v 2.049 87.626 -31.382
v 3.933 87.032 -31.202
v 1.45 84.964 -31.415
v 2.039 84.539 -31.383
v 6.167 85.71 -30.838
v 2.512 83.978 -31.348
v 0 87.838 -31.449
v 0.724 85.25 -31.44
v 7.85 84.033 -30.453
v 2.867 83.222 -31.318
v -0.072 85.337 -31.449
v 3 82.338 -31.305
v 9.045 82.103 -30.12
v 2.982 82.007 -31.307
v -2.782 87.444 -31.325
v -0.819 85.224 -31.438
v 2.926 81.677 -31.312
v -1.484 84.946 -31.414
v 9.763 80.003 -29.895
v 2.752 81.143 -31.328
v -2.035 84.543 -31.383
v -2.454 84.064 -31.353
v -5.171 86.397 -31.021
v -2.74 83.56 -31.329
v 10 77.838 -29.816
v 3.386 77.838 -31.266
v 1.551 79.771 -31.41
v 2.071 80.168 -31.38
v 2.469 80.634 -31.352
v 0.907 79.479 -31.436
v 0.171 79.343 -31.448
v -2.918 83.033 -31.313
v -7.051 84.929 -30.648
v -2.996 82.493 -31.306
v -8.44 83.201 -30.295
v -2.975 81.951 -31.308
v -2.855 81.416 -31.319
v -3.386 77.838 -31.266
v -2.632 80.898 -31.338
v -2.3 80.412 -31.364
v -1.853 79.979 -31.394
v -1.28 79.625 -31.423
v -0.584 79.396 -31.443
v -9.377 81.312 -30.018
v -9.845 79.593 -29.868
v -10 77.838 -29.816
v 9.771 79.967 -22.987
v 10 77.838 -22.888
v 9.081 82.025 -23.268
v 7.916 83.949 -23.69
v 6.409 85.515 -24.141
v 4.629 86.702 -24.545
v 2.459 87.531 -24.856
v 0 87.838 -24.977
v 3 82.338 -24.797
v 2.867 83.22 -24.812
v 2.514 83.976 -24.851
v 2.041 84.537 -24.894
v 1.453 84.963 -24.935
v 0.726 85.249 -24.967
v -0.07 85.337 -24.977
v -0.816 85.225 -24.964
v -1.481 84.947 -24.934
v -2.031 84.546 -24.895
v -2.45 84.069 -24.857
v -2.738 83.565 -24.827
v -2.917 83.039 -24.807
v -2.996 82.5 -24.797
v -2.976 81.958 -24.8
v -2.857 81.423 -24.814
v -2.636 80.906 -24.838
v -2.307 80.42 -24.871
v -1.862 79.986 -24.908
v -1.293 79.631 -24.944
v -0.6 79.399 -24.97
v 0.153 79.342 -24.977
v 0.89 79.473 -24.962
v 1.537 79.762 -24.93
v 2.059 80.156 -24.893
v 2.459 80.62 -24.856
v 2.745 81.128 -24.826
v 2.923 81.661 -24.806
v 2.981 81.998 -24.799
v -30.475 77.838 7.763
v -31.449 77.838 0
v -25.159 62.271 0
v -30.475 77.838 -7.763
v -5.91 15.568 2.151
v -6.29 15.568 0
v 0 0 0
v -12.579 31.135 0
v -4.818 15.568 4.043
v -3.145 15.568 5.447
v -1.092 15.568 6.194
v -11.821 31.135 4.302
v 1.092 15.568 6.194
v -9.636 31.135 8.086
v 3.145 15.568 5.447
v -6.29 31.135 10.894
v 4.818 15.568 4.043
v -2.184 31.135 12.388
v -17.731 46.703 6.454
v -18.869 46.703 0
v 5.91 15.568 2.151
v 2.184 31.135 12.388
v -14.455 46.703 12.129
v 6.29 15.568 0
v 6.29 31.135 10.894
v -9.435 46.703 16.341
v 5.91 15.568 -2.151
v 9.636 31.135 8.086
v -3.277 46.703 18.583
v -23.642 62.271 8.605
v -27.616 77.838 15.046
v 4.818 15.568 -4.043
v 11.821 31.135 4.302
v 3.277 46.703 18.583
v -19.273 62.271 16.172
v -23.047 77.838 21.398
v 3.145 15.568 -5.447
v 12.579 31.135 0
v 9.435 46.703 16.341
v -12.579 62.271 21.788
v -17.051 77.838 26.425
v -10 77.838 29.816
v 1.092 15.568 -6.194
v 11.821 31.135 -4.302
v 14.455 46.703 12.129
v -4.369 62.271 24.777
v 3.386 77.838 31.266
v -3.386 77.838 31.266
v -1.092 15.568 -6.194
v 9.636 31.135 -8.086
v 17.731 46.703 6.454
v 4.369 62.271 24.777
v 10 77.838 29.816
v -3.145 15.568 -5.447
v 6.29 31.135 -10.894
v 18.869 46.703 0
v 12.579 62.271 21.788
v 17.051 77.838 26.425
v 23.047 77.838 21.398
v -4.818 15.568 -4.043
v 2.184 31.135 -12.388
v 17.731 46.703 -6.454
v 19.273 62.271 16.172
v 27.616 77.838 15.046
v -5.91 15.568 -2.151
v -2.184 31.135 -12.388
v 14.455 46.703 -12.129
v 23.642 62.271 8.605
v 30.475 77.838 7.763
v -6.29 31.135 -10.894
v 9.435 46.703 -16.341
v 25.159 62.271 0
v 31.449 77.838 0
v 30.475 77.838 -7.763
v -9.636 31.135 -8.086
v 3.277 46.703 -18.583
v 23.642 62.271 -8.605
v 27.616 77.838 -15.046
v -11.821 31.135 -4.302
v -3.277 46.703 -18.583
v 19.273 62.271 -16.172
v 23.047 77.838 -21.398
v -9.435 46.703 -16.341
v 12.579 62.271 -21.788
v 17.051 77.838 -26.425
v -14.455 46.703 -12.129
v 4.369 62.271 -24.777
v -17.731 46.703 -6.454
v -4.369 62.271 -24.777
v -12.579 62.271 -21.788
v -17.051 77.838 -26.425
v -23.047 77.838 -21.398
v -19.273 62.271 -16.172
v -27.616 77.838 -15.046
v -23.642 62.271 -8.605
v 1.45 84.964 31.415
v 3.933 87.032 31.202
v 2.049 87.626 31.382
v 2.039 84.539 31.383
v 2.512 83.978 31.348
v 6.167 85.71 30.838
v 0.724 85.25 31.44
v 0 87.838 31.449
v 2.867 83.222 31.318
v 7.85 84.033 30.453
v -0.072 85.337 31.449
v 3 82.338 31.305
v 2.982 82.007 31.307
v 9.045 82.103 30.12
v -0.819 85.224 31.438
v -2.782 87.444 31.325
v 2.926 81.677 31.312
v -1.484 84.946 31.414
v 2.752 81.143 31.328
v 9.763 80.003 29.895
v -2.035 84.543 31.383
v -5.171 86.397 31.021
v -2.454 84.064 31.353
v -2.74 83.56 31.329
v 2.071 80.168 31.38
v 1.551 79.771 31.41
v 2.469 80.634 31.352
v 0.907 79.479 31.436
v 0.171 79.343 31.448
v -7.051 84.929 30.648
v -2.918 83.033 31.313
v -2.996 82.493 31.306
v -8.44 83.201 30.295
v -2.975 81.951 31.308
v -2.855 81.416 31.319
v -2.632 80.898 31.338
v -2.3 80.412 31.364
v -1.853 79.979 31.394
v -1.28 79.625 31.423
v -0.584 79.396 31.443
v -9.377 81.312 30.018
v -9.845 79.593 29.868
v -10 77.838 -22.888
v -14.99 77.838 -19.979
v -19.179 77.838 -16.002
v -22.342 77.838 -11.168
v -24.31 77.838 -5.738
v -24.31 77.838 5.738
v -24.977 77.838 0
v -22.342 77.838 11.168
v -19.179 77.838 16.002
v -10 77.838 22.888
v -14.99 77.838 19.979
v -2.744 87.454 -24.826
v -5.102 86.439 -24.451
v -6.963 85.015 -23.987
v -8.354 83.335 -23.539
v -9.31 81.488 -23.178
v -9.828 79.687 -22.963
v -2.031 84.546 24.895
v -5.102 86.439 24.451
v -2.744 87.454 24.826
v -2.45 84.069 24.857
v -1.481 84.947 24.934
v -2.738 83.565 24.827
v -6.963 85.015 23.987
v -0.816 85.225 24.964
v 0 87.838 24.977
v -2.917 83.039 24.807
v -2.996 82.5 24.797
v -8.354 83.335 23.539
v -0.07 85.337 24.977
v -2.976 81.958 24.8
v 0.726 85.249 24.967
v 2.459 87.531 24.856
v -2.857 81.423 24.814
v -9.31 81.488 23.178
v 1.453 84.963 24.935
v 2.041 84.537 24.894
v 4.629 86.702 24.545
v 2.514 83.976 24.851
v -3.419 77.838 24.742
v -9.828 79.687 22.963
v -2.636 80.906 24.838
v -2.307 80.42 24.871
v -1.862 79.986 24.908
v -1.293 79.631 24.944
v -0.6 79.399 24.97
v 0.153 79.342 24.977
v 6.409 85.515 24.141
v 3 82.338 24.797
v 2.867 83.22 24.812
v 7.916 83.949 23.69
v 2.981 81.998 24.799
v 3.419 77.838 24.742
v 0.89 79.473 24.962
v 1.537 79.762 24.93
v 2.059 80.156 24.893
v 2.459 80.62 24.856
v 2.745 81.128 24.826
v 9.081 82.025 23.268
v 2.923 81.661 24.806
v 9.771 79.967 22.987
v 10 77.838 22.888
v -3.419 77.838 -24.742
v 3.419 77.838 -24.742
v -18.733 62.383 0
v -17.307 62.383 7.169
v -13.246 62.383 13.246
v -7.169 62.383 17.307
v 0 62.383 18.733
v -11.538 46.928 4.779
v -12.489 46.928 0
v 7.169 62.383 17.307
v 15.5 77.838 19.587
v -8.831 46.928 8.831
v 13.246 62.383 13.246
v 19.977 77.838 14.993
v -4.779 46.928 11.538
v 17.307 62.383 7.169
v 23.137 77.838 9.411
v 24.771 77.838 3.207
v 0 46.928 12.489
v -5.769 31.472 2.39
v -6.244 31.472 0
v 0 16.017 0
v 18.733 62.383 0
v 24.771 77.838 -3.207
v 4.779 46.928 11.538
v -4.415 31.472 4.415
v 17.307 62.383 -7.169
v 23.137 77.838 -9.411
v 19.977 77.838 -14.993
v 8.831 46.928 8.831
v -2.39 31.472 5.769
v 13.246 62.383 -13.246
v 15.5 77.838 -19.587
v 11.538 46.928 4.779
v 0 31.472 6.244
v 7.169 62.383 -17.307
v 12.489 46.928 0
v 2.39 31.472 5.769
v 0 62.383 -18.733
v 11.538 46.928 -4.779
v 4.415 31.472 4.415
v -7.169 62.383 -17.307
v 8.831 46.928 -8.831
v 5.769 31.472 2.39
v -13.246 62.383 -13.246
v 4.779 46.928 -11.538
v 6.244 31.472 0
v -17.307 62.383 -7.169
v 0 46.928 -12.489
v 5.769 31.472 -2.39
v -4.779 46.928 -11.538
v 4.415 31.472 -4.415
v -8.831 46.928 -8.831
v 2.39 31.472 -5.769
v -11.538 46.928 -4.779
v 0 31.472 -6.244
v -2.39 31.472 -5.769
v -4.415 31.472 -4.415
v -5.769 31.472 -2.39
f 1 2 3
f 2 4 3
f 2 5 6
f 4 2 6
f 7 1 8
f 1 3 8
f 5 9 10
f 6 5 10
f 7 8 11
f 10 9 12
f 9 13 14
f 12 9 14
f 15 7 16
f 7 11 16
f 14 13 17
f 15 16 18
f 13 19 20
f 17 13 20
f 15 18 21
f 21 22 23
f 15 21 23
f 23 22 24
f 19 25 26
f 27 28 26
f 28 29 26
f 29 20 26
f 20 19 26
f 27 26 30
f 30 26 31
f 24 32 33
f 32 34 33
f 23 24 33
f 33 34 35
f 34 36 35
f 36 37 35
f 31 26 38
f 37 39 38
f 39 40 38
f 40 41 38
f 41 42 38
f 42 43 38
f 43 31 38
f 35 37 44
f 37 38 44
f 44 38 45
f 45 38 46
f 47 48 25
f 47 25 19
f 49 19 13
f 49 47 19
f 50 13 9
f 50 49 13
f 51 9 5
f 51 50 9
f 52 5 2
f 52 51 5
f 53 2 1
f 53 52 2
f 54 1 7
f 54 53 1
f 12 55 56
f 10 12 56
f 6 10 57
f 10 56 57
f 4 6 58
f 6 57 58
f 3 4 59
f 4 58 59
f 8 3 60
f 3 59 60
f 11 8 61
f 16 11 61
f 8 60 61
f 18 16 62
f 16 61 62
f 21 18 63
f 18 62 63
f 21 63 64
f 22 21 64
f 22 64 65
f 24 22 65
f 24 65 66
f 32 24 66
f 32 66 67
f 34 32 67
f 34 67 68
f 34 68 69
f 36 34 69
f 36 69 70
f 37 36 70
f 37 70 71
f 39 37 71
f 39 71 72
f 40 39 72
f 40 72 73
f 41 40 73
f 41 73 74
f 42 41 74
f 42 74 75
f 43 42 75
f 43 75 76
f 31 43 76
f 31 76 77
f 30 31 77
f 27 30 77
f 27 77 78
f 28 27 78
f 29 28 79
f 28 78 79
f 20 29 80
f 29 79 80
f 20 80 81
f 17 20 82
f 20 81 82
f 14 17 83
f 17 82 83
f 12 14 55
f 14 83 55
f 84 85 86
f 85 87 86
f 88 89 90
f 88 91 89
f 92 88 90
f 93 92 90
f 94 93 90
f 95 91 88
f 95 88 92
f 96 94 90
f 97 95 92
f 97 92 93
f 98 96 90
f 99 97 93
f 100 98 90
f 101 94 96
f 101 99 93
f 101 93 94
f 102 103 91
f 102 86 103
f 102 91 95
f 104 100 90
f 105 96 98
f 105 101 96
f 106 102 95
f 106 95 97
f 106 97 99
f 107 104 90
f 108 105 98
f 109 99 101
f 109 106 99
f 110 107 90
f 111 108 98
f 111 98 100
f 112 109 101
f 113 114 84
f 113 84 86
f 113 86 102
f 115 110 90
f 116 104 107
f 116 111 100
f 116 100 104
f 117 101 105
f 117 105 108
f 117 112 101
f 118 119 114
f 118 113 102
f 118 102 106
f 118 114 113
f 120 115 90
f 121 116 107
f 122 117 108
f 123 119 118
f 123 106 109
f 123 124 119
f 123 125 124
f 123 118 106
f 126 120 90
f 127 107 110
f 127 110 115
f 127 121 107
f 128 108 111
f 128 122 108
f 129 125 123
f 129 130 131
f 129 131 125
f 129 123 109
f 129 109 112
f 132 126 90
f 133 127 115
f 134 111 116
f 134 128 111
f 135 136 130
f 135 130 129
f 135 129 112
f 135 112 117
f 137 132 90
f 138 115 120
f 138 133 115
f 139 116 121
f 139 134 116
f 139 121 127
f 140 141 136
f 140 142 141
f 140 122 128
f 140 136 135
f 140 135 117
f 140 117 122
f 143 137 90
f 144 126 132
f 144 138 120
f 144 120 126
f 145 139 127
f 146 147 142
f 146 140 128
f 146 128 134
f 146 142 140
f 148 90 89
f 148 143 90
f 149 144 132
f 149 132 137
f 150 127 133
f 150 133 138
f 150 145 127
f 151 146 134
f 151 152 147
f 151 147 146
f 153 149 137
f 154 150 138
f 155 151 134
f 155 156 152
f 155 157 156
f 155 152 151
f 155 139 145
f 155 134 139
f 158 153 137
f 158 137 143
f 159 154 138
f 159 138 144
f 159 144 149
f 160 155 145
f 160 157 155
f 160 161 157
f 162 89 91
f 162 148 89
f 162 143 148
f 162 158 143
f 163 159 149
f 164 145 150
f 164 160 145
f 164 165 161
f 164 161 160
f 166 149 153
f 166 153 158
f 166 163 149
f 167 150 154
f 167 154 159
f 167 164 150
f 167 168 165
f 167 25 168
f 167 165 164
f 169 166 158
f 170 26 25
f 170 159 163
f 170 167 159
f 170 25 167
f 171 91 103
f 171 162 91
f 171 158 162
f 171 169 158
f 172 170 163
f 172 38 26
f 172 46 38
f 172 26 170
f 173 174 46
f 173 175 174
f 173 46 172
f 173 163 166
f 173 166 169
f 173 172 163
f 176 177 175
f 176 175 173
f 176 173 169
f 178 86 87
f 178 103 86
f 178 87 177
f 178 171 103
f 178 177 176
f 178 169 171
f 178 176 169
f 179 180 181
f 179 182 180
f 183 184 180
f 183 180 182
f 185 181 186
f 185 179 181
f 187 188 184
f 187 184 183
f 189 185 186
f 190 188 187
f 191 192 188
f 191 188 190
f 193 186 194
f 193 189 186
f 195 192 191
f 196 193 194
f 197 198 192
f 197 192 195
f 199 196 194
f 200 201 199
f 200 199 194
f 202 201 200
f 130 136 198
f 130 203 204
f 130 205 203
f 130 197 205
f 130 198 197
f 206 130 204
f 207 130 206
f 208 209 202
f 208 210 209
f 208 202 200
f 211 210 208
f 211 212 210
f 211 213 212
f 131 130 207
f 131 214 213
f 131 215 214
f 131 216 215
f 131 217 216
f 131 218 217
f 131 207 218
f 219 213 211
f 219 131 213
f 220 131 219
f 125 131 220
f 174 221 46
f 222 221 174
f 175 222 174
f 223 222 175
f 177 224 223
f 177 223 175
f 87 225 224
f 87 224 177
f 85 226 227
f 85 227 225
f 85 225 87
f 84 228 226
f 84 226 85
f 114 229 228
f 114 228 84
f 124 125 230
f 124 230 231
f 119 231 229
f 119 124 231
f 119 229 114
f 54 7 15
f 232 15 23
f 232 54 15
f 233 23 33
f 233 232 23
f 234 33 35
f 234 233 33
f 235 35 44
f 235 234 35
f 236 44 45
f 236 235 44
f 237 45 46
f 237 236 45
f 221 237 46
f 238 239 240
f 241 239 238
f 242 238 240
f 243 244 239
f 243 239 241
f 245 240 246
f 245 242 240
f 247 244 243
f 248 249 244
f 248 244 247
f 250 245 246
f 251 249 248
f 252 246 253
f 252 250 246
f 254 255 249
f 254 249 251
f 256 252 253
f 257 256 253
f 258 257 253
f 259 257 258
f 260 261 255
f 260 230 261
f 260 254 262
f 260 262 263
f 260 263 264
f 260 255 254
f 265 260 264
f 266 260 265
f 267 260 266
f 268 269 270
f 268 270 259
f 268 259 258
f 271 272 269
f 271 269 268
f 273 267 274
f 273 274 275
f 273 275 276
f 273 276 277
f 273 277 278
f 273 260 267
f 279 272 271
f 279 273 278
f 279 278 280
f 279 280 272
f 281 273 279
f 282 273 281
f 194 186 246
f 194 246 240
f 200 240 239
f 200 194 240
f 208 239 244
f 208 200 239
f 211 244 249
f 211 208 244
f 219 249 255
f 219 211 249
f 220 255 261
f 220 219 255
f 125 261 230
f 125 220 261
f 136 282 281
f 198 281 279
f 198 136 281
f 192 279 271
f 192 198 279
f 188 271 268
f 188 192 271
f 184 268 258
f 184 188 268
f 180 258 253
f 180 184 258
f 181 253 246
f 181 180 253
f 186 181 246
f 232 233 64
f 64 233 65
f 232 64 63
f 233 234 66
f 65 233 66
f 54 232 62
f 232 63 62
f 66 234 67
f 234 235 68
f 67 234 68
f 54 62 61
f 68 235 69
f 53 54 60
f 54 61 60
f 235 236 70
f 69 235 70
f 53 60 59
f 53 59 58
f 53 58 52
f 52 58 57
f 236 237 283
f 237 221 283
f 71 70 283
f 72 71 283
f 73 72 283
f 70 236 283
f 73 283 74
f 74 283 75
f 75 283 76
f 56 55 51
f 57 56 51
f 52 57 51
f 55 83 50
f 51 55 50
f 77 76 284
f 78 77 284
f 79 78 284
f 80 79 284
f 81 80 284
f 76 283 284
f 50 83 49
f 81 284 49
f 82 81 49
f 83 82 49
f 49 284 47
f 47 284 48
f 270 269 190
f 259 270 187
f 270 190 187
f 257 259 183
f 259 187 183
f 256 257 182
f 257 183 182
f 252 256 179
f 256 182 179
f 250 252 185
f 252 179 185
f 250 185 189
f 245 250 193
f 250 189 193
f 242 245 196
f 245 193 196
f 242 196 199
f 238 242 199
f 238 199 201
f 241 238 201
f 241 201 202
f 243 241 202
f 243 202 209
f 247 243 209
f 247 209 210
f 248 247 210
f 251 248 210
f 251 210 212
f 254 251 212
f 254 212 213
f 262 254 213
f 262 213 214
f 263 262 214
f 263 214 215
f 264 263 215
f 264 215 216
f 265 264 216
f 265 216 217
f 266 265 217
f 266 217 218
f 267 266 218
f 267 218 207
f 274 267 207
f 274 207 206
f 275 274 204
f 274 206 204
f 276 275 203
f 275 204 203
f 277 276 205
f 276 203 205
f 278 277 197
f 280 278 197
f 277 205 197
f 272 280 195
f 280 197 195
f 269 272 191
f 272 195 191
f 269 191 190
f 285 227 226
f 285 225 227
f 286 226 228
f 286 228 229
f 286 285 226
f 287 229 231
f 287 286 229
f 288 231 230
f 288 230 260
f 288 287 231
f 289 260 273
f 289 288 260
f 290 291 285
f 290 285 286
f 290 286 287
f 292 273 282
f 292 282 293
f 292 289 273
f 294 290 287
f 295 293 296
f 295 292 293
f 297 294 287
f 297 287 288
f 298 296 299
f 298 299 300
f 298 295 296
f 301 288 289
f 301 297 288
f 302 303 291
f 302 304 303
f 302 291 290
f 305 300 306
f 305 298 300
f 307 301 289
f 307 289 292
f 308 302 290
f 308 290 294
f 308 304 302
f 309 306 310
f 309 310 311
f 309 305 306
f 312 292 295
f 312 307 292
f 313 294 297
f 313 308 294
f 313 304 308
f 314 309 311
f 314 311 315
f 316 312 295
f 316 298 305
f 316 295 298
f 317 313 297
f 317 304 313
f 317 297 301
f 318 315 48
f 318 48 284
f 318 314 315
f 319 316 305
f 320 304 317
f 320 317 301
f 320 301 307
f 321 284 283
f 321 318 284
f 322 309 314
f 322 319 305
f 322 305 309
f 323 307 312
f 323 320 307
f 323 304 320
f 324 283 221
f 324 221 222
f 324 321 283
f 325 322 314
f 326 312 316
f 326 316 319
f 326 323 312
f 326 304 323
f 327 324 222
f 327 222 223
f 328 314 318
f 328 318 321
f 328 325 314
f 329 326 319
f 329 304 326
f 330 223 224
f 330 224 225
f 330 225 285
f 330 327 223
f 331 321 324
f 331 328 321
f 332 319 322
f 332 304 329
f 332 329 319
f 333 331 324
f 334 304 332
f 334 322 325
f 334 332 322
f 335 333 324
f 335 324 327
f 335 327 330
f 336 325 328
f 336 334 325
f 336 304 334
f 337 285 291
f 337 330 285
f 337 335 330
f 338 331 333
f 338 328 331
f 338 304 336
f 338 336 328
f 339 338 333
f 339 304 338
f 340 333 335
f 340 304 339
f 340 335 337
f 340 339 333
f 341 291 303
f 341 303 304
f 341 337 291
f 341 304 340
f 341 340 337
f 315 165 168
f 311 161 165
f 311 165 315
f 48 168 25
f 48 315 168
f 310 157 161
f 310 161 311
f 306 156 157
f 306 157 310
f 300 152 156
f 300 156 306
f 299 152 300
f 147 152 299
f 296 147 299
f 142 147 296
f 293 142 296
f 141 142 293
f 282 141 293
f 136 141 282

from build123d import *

# Parameters (mm, degrees)
SALIENTE_EXTRUIR1_DEPTH = 10
CORTAR_EXTRUIR1_DEPTH   = 113.828716794
CROQUIS5_R              = 3
CORTAR_EXTRUIR2_DEPTH   = 113.828716928


with BuildPart() as part:
    # Croquis1 → Revolución1 (revolve)
    with BuildSketch(Plane.XY):
        Polygon((0, 0), (-31.448700737, 77.838265751), (-24.977492281, 77.838265751), (0, 16.016802975), align=None)
    revolve(axis=Axis((0, 0, 0), (0, 1, 0)))

    # Croquis2 → Saliente-Extruir1 (add)
    with BuildSketch(Plane(origin=(0, 77.838265751, 0), x_dir=(1, 0, 0), z_dir=(0, 1, 0))):
        with BuildLine():
            Line((10, -22.888318432), (10, -29.816451466))
            ThreePointArc((10, -29.816451466), (0, -31.448700737), (-10, -29.816451466))
            Line((-10, -29.816451466), (-10, -22.888318432))
            ThreePointArc((-10, -22.888318432), (0, -24.977492281), (10, -22.888318432))
        make_face()
        with BuildLine():
            Line((10, 22.888318432), (10, 29.816451466))
            ThreePointArc((10, 29.816451466), (0, 31.448700737), (-10, 29.816451466))
            Line((-10, 29.816451466), (-10, 22.888318432))
            ThreePointArc((-10, 22.888318432), (0, 24.977492281), (10, 22.888318432))
        make_face()
    extrude(amount=SALIENTE_EXTRUIR1_DEPTH)

    # Croquis3 → Cortar-Extruir1 (cut, through all)
    with BuildSketch(Plane.XY.offset(32)):
        with BuildLine():
            Line((10, 87.838265751), (10, 77.838265751))
            ThreePointArc((10, 77.838265751), (7.071067812, 84.909333563), (0, 87.838265751))
            Line((0, 87.838265751), (10, 87.838265751))
        make_face()
    extrude(amount=-CORTAR_EXTRUIR1_DEPTH, mode=Mode.SUBTRACT)

    # Croquis5 → Cortar-Extruir2 (cut, through all)
    with BuildSketch(Plane.XY.offset(32)):
        with Locations((0, 82.338265751)):
            Circle(CROQUIS5_R)
        with BuildLine():
            Line((-10, 77.838265751), (-10, 87.838265751))
            Line((-10, 87.838265751), (0, 87.838265751))
            ThreePointArc((0, 87.838265751), (-7.071067812, 84.909333563), (-10, 77.838265751))
        make_face()
    extrude(amount=-CORTAR_EXTRUIR2_DEPTH, mode=Mode.SUBTRACT)


solid = part.part
